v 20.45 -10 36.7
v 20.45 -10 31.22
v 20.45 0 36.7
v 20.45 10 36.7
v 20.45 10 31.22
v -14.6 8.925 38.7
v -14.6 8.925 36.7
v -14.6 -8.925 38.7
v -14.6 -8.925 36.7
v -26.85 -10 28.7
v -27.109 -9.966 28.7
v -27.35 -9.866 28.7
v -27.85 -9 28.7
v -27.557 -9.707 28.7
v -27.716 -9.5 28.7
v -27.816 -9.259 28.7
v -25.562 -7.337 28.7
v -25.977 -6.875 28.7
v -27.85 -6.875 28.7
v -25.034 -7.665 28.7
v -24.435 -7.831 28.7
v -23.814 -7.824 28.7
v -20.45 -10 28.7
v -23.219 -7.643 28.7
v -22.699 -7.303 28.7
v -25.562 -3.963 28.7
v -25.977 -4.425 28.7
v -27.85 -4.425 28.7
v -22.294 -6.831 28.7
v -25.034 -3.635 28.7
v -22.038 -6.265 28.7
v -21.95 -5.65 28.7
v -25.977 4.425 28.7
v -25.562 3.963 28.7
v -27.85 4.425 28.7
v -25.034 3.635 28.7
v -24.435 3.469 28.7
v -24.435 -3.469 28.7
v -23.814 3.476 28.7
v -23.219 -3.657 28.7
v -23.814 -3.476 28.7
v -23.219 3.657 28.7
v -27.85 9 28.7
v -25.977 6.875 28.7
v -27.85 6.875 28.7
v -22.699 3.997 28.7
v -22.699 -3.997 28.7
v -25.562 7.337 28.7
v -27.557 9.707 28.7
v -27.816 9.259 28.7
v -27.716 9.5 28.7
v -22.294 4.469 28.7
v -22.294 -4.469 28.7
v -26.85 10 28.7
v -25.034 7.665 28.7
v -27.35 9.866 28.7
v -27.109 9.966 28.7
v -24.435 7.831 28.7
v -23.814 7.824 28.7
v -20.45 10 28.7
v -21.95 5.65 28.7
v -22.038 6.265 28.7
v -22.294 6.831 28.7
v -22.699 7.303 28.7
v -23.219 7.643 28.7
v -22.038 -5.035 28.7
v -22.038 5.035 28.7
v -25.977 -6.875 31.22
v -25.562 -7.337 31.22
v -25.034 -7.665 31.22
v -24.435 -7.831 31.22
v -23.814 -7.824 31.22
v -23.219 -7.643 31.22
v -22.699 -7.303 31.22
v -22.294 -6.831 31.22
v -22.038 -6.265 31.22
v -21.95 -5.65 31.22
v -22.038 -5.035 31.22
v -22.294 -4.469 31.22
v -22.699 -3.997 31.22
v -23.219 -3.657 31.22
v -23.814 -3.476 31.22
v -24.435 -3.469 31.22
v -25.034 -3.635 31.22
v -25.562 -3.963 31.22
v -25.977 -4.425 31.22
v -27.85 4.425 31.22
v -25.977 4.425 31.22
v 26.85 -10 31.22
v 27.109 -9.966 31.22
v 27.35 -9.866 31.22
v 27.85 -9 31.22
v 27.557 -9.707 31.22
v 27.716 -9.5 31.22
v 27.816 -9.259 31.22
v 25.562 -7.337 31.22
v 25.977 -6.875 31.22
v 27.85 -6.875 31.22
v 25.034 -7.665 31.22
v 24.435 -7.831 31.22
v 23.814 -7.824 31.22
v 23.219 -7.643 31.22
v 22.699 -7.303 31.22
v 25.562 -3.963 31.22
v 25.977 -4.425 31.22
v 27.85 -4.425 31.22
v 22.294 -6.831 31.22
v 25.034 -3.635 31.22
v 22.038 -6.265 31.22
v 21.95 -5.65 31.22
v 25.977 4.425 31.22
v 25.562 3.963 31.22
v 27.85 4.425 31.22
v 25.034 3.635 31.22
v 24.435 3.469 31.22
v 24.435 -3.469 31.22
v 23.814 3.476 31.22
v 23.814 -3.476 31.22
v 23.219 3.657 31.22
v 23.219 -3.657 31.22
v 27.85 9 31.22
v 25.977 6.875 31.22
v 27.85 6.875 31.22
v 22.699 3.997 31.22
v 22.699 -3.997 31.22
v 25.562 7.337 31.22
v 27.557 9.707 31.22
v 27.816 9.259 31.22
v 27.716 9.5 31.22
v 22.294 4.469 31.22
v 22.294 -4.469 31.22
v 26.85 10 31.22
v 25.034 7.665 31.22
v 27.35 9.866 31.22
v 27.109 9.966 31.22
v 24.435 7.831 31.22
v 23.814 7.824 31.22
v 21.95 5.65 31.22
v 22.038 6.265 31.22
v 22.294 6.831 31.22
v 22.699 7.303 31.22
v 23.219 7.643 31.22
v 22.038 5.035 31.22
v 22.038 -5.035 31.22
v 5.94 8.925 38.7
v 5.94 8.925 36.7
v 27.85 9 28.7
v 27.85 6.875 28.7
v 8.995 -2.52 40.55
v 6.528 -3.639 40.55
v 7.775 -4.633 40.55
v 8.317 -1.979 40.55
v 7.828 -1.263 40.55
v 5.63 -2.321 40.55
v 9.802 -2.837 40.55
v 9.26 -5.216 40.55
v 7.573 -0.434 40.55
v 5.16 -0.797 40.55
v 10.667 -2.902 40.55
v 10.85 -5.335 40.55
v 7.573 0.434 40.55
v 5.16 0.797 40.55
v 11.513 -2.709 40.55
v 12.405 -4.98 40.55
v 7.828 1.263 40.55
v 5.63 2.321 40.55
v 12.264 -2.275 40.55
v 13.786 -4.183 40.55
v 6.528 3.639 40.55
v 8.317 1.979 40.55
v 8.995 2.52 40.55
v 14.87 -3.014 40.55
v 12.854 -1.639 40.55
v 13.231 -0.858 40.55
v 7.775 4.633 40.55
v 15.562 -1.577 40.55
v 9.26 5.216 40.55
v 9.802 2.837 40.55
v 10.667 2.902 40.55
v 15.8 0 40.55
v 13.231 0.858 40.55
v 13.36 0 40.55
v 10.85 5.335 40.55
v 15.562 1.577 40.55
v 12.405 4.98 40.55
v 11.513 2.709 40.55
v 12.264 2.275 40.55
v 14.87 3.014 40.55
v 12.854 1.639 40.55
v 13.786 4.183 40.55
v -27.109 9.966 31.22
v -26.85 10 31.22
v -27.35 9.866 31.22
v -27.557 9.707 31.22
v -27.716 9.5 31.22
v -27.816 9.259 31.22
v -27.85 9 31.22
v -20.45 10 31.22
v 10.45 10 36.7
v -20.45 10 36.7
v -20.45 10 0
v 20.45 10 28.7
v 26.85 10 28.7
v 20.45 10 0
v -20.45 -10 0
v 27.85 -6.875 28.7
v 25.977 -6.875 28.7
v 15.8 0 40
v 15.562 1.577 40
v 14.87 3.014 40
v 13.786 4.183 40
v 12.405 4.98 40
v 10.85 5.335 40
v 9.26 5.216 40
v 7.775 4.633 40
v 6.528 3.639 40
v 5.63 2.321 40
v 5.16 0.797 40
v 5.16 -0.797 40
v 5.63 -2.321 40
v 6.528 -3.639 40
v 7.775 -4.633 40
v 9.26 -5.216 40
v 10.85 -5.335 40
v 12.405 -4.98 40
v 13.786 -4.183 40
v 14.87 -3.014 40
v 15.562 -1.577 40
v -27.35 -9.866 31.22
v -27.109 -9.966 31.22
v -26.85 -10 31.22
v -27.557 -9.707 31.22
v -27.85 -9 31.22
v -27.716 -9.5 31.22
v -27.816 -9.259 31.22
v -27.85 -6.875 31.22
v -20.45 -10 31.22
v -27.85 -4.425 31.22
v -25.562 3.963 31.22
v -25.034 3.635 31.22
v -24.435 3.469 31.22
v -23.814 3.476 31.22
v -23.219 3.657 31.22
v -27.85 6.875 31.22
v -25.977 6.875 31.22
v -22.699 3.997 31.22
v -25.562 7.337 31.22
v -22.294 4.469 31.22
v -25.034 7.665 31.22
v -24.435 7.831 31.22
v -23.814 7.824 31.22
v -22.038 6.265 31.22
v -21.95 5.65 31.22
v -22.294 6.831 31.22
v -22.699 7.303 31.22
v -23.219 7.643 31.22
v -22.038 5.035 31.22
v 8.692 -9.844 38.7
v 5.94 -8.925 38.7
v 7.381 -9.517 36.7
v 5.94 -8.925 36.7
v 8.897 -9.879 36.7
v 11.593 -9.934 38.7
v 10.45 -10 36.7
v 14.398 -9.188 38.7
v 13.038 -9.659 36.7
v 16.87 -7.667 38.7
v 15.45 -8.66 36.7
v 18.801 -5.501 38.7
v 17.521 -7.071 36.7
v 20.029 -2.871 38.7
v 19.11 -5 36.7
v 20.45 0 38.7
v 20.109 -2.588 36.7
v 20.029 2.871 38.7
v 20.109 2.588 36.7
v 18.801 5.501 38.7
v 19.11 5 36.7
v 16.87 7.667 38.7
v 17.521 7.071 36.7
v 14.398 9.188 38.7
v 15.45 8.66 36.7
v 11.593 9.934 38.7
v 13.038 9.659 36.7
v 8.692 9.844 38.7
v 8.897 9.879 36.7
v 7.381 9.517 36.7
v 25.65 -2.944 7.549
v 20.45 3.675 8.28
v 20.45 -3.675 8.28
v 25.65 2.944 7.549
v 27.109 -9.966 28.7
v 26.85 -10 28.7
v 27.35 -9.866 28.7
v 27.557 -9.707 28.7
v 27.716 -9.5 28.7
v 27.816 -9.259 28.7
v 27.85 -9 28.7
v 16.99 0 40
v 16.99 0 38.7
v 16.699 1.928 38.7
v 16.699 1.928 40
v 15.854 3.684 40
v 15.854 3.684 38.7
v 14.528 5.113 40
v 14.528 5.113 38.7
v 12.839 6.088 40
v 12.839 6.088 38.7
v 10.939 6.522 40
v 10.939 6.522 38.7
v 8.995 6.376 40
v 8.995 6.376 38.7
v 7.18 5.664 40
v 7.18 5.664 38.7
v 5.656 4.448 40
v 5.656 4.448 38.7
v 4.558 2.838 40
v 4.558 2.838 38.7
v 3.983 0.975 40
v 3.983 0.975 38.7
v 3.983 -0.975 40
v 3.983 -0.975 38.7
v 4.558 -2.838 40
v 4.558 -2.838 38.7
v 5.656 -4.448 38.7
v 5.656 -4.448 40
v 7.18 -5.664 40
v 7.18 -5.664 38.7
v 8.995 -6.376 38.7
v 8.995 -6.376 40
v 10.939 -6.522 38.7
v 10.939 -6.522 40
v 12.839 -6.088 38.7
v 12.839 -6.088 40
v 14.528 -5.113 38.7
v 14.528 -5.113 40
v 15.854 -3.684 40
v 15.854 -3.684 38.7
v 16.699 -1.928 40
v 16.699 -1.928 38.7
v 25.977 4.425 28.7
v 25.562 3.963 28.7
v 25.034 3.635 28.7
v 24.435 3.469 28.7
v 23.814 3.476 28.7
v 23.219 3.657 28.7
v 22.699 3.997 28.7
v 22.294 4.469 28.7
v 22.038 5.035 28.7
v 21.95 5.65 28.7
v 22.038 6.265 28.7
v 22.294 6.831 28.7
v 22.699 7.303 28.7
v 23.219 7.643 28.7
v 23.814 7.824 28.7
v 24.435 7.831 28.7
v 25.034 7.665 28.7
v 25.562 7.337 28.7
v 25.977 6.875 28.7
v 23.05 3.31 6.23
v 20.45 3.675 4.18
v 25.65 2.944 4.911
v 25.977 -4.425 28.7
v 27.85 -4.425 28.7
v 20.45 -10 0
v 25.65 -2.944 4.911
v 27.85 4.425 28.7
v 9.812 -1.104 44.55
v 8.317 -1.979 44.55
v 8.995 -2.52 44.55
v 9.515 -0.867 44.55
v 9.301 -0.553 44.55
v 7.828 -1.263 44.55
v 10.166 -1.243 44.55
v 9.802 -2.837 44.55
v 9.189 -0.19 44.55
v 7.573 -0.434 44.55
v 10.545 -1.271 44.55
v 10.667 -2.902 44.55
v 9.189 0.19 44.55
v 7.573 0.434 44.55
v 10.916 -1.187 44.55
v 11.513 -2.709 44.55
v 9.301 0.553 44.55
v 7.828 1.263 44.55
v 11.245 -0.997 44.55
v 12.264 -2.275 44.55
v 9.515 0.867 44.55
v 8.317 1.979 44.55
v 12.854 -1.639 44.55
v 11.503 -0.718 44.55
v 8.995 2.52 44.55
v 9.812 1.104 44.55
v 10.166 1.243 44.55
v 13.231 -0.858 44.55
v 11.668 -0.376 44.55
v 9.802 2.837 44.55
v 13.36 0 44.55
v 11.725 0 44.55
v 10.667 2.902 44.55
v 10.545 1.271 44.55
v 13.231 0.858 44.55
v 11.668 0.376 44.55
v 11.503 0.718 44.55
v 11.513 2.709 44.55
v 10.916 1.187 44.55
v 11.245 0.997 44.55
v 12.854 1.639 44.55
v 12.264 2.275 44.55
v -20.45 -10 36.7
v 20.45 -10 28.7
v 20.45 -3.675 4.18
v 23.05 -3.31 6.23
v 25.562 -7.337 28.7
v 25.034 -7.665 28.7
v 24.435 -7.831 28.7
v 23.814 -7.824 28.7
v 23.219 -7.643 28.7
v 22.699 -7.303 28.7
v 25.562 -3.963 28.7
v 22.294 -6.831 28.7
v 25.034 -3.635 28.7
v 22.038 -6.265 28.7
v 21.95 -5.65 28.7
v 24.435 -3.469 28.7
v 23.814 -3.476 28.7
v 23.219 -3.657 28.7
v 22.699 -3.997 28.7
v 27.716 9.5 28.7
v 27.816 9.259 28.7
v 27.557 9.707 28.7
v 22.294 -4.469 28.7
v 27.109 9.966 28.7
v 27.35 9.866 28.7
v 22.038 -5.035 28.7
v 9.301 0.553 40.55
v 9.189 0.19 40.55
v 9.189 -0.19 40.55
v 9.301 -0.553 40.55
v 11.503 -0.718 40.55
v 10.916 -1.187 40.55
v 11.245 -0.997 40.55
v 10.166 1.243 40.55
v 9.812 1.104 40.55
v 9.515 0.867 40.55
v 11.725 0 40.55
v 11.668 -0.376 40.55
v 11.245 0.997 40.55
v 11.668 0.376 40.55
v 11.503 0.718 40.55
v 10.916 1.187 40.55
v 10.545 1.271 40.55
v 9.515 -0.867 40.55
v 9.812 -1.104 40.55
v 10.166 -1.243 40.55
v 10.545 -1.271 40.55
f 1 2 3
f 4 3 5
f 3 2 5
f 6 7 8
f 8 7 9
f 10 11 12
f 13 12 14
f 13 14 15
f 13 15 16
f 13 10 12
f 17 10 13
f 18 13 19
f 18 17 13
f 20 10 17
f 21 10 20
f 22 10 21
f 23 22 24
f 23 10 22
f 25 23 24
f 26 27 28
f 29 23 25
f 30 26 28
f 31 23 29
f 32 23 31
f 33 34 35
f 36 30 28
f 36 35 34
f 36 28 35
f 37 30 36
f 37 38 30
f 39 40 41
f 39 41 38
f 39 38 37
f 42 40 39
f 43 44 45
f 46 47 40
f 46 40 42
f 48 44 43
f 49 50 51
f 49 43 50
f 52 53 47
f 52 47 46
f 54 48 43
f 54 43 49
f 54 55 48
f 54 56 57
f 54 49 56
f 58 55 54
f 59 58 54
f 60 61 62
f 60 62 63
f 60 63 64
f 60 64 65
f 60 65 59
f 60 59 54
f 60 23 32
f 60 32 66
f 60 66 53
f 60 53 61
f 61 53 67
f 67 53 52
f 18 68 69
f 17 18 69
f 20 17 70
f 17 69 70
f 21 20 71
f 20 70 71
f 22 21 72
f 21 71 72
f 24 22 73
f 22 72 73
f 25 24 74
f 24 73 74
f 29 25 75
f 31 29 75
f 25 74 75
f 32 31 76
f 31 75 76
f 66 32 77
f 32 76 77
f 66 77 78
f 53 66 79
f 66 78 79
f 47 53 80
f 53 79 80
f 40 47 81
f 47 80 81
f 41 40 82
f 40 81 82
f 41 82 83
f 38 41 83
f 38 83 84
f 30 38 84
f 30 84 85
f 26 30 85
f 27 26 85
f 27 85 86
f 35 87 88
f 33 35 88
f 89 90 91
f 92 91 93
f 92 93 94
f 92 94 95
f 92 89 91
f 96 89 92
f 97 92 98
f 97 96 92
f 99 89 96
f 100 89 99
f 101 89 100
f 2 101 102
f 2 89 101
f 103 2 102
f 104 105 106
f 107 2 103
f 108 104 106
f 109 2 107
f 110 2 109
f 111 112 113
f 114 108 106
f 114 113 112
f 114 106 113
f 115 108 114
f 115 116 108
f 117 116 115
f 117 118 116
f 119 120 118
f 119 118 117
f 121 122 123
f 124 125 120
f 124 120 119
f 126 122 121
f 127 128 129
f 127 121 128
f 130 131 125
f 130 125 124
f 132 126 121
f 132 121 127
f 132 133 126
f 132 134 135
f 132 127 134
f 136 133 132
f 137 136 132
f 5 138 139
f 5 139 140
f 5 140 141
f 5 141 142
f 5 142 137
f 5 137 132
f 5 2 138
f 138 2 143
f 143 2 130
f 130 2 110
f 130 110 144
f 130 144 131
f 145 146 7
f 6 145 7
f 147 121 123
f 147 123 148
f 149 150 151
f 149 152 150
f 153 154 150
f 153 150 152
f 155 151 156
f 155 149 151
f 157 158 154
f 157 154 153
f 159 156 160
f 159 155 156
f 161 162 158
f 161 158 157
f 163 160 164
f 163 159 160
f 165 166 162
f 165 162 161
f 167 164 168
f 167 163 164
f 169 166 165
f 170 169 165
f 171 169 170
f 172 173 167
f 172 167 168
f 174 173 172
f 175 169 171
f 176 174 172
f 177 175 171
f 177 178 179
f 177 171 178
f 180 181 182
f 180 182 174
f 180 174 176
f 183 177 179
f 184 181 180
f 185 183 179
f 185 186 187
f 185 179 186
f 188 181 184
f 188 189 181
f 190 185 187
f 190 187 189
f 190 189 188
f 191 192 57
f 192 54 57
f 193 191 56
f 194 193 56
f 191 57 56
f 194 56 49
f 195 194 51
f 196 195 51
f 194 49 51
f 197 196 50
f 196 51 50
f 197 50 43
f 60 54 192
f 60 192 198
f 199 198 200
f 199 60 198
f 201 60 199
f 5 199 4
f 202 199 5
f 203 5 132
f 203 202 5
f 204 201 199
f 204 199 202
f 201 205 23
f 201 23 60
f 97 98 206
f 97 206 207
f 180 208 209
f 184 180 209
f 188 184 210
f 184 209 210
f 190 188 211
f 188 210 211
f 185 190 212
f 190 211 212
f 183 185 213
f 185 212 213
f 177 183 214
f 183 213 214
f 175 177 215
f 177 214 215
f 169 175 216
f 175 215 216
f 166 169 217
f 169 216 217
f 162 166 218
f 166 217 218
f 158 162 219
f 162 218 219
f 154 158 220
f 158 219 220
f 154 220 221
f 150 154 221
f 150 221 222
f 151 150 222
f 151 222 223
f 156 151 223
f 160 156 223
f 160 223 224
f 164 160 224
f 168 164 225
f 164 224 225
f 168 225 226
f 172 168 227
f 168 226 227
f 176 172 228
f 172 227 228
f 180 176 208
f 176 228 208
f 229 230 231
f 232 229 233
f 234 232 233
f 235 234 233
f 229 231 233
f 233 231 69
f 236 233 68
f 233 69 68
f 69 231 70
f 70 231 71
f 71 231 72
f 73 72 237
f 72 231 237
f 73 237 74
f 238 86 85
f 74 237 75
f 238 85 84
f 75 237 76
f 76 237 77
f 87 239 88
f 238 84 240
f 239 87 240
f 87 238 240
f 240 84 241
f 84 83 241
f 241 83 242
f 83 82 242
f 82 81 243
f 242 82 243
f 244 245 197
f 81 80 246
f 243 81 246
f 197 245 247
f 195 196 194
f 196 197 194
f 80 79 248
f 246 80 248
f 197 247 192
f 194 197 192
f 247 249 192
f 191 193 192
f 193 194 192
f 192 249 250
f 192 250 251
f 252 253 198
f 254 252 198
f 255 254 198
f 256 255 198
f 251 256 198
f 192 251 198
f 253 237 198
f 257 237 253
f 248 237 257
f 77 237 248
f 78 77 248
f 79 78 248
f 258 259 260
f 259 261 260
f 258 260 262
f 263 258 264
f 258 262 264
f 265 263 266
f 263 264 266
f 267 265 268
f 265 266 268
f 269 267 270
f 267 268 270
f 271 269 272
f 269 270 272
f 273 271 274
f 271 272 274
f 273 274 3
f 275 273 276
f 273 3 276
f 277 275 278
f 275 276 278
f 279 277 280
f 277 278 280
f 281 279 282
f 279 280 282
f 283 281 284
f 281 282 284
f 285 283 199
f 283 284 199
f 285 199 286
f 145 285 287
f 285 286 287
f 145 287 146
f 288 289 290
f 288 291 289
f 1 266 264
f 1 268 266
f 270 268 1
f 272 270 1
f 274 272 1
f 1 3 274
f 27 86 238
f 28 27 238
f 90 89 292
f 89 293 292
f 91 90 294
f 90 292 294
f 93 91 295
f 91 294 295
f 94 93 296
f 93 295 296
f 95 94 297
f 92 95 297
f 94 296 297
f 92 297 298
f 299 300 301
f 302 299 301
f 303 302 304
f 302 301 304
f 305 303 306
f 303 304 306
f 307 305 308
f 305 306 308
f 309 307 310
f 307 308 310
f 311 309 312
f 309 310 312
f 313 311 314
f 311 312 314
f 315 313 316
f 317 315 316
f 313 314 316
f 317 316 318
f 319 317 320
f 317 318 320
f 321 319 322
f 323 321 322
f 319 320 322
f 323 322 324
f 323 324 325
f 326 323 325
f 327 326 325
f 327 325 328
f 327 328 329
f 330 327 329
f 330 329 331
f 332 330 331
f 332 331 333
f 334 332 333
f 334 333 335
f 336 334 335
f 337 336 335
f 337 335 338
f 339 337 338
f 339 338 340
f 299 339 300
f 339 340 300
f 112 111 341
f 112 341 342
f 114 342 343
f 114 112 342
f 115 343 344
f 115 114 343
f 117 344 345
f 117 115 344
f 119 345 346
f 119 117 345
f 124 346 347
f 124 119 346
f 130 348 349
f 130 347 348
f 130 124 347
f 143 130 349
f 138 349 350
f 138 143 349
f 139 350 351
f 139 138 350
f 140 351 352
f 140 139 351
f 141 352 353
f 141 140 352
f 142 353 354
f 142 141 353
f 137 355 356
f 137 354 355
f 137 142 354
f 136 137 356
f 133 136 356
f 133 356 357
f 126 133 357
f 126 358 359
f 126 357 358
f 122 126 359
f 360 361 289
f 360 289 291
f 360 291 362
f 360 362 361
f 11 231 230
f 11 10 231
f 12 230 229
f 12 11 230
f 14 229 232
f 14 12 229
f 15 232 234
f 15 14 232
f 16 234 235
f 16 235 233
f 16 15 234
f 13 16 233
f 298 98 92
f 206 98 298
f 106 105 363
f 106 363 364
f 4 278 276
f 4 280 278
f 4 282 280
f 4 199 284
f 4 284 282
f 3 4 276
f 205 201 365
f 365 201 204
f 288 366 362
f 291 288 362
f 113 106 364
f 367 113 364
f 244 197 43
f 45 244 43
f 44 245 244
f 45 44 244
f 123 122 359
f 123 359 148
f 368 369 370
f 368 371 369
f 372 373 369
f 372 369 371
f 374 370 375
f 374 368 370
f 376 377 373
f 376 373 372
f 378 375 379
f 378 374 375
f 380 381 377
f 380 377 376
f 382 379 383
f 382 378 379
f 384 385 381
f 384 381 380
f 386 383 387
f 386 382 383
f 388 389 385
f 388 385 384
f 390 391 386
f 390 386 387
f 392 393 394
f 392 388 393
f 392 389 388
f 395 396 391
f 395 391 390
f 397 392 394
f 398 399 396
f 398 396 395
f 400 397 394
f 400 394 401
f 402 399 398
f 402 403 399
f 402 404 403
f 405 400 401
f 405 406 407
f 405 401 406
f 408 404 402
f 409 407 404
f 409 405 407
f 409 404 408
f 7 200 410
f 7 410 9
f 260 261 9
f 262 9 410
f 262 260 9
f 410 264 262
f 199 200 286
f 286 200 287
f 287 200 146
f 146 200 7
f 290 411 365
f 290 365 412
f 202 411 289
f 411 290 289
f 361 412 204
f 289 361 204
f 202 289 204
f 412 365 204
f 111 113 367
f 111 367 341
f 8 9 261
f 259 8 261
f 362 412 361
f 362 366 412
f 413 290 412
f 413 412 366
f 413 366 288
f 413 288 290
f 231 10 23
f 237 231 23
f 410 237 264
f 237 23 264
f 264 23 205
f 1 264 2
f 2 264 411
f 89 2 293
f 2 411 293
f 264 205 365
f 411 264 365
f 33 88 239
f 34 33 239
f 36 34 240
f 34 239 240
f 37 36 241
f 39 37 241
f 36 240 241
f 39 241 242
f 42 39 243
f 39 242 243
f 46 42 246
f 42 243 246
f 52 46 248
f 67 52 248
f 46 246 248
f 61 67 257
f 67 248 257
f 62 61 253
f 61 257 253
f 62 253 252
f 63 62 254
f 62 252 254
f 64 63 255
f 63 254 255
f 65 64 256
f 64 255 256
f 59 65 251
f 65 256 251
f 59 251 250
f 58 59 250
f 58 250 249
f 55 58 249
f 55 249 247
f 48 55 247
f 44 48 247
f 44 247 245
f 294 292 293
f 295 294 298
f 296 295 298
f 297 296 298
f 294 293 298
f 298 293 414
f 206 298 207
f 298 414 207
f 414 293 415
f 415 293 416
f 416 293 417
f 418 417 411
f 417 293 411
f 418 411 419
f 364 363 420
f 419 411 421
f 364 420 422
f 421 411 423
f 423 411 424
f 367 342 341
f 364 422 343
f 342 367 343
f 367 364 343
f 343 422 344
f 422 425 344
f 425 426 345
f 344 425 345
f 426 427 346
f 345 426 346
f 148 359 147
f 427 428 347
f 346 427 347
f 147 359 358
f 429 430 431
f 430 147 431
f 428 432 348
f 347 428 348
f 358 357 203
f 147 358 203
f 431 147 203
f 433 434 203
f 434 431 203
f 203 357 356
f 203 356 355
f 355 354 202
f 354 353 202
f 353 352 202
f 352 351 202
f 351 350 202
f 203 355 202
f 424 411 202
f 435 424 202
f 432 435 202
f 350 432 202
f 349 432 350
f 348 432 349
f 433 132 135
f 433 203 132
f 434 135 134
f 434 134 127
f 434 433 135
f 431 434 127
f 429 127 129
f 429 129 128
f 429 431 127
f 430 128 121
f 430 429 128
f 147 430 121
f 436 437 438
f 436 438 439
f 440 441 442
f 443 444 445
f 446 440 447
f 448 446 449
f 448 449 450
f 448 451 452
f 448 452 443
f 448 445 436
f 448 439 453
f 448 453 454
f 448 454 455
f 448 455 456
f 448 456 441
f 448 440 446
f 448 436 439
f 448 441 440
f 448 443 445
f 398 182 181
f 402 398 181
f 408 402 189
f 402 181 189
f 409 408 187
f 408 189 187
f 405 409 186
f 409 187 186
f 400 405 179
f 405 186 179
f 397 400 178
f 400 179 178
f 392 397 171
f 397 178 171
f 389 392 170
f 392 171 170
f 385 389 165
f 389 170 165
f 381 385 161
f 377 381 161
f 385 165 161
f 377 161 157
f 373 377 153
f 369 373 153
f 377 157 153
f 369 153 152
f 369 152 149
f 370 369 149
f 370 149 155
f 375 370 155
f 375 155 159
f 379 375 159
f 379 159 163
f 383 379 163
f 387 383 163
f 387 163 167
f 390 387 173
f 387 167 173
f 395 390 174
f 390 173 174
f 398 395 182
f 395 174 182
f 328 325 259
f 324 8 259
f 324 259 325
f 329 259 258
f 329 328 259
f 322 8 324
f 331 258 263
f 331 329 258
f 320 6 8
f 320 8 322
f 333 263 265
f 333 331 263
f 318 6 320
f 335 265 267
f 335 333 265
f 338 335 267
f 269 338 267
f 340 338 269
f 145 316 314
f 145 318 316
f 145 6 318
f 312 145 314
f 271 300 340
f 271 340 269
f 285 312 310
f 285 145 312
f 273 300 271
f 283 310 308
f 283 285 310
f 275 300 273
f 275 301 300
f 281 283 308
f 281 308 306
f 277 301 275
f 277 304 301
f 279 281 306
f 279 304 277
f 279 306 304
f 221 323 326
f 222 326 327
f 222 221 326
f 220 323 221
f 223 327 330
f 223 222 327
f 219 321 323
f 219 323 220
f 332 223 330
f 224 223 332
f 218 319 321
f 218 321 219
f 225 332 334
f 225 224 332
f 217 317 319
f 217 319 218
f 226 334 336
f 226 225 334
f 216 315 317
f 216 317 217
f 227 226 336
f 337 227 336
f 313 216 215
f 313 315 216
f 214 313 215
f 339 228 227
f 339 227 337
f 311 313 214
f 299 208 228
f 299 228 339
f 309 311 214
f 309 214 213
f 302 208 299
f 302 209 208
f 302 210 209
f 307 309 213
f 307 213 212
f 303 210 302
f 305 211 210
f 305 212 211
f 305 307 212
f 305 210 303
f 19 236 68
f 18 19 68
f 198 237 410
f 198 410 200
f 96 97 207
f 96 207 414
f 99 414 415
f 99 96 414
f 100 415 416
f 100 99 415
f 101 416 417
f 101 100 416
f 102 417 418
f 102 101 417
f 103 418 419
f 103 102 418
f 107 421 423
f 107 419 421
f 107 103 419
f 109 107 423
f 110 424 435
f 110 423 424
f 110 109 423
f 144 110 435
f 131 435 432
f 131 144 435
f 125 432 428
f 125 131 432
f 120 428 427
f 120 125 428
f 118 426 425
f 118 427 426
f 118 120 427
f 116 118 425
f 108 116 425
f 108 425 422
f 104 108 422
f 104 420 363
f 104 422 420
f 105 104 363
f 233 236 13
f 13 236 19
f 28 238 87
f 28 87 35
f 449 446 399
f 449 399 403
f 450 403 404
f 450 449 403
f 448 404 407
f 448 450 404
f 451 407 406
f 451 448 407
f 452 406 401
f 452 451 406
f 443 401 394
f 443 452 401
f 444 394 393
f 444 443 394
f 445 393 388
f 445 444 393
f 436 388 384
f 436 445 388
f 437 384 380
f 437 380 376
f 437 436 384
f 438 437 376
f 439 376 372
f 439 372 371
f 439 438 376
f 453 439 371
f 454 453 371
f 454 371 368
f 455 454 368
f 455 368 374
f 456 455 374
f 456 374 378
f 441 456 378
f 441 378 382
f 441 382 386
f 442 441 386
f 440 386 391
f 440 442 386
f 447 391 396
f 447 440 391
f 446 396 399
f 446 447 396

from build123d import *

# Parameters (mm, degrees)
SKETCH_1_W             = 40.9
SKETCH_1_H             = 20
EXTRUDE_1_DEPTH        = 36.7
SKETCH_2_R             = 10
EXTRUDE_2_DEPTH        = 2
SKETCH_3_R             = 6.54
EXTRUDE_3_DEPTH        = 1.3
SKETCH_4_R             = 5.35
EXTRUDE_4_DEPTH        = 0.55
SKETCH_5_R             = 2.91
SKETCH_5_R_2           = 1.275
EXTRUDE_5_DEPTH        = 4
EXTRUDE_6_DEPTH        = 2
SKETCH_7_W             = 2.52
SKETCH_7_H             = 20
EXTRUDE_7_DEPTH        = 7.4
CUT_EXTRUDE_3_DEPTH    = 3.4
FILLET_1_R             = 1
FILLET_1_OF_MIRROR_1_R = 1
SKETCH_9_W             = 4.1
SKETCH_9_H             = 7.35
EXTRUDE_8_DEPTH        = 5.2
EXTRUDE_8_TAPER        = 8


with BuildPart() as part:
    # 스케치1 → 보스-돌출1 (new body)
    with BuildSketch(Plane.XY):
        Rectangle(SKETCH_1_W, SKETCH_1_H)
    extrude(amount=EXTRUDE_1_DEPTH)

    # 스케치2 → 보스-돌출2 (add)
    with BuildSketch(Plane.XY.offset(36.7)):
        with Locations((10.45, 0)):
            Circle(SKETCH_2_R)
    extrude(amount=EXTRUDE_2_DEPTH)

    # 스케치3 → 보스-돌출3 (add)
    with BuildSketch(Plane.XY.offset(38.7)):
        with Locations((10.45, 0)):
            Circle(SKETCH_3_R)
    extrude(amount=EXTRUDE_3_DEPTH)

    # 스케치4 → 보스-돌출4 (add)
    with BuildSketch(Plane.XY.offset(40)):
        with Locations((10.45, 0)):
            Circle(SKETCH_4_R)
    extrude(amount=EXTRUDE_4_DEPTH)

    # 스케치5 → 보스-돌출5 (add)
    with BuildSketch(Plane.XY.offset(40.55)):
        with Locations((10.45, 0)):
            Circle(SKETCH_5_R)
        with Locations((10.45, 0)):
            Circle(SKETCH_5_R_2, mode=Mode.SUBTRACT)
    extrude(amount=EXTRUDE_5_DEPTH)

    # 스케치6 → 보스-돌출6 (add)
    with BuildSketch(Plane.XY.offset(36.7)):
        with BuildLine():
            Line((5.939526078, 8.925), (-14.6, 8.925))
            Line((-14.6, 8.925), (-14.6, -8.925))
            Line((-14.6, -8.925), (5.939526078, -8.925))
            ThreePointArc((5.939526078, -8.925), (0.45, 0), (5.939526078, 8.925))
        make_face()
    extrude(amount=EXTRUDE_6_DEPTH)

    # 스케치7 → 보스-돌출7 (add)
    with BuildSketch(Plane(origin=(20.45, 0, 0), x_dir=(0, 0, -1), z_dir=(1, 0, 0))):
        with Locations((-29.96, 0)):
            Rectangle(SKETCH_7_W, SKETCH_7_H)
    extrude_7 = extrude(amount=EXTRUDE_7_DEPTH)

    # 스케치8 → 컷-돌출3 (cut)
    with BuildSketch(Plane.XY.offset(31.22)):
        with BuildLine():
            Line((27.85, 6.875), (27.85, 4.425))
            Line((27.85, 4.425), (25.977395688, 4.425))
            ThreePointArc((25.977395688, 4.425), (21.95, 5.65), (25.977395688, 6.875))
            Line((25.977395688, 6.875), (27.85, 6.875))
        make_face()
        with BuildLine():
            Line((27.85, -4.425), (27.85, -6.875))
            Line((27.85, -6.875), (25.977395688, -6.875))
            ThreePointArc((25.977395688, -6.875), (21.95, -5.65), (25.977395688, -4.425))
            Line((25.977395688, -4.425), (27.85, -4.425))
        make_face()
    cut_extrude_3 = extrude(amount=-CUT_EXTRUDE_3_DEPTH, mode=Mode.SUBTRACT)

    # 필렛1
    fillet_1_edges = [part.edges().sort_by_distance(p)[0] for p in [
        (27.85, -10, 29.96),
        (27.85, 10, 29.96),
    ]]
    fillet(fillet_1_edges, radius=FILLET_1_R)

    # 대칭 복사1: 보스-돌출7, 컷-돌출3 across plane
    add(extrude_7.mirror(Plane(origin=(0, 0, 0), x_dir=(0, 0, 1), z_dir=(1, 0, 0))))
    add(cut_extrude_3.mirror(Plane(origin=(0, 0, 0), x_dir=(0, 0, 1), z_dir=(1, 0, 0))), mode=Mode.SUBTRACT)

    # 필렛1 of 대칭 복사1
    fillet_1_of_mirror_1_edges = [part.edges().sort_by_distance(p)[0] for p in [
        (-27.85, -10, 29.96),
        (-27.85, 10, 29.96),
    ]]
    fillet(fillet_1_of_mirror_1_edges, radius=FILLET_1_OF_MIRROR_1_R)

    # 스케치9 → 보스-돌출8 (add)
    with BuildSketch(Plane(origin=(20.45, 0, 0), x_dir=(0, 0, -1), z_dir=(1, 0, 0))):
        with Locations((-6.23, 0)):
            Rectangle(SKETCH_9_W, SKETCH_9_H)
    extrude(amount=EXTRUDE_8_DEPTH, taper=EXTRUDE_8_TAPER)


solid = part.part
